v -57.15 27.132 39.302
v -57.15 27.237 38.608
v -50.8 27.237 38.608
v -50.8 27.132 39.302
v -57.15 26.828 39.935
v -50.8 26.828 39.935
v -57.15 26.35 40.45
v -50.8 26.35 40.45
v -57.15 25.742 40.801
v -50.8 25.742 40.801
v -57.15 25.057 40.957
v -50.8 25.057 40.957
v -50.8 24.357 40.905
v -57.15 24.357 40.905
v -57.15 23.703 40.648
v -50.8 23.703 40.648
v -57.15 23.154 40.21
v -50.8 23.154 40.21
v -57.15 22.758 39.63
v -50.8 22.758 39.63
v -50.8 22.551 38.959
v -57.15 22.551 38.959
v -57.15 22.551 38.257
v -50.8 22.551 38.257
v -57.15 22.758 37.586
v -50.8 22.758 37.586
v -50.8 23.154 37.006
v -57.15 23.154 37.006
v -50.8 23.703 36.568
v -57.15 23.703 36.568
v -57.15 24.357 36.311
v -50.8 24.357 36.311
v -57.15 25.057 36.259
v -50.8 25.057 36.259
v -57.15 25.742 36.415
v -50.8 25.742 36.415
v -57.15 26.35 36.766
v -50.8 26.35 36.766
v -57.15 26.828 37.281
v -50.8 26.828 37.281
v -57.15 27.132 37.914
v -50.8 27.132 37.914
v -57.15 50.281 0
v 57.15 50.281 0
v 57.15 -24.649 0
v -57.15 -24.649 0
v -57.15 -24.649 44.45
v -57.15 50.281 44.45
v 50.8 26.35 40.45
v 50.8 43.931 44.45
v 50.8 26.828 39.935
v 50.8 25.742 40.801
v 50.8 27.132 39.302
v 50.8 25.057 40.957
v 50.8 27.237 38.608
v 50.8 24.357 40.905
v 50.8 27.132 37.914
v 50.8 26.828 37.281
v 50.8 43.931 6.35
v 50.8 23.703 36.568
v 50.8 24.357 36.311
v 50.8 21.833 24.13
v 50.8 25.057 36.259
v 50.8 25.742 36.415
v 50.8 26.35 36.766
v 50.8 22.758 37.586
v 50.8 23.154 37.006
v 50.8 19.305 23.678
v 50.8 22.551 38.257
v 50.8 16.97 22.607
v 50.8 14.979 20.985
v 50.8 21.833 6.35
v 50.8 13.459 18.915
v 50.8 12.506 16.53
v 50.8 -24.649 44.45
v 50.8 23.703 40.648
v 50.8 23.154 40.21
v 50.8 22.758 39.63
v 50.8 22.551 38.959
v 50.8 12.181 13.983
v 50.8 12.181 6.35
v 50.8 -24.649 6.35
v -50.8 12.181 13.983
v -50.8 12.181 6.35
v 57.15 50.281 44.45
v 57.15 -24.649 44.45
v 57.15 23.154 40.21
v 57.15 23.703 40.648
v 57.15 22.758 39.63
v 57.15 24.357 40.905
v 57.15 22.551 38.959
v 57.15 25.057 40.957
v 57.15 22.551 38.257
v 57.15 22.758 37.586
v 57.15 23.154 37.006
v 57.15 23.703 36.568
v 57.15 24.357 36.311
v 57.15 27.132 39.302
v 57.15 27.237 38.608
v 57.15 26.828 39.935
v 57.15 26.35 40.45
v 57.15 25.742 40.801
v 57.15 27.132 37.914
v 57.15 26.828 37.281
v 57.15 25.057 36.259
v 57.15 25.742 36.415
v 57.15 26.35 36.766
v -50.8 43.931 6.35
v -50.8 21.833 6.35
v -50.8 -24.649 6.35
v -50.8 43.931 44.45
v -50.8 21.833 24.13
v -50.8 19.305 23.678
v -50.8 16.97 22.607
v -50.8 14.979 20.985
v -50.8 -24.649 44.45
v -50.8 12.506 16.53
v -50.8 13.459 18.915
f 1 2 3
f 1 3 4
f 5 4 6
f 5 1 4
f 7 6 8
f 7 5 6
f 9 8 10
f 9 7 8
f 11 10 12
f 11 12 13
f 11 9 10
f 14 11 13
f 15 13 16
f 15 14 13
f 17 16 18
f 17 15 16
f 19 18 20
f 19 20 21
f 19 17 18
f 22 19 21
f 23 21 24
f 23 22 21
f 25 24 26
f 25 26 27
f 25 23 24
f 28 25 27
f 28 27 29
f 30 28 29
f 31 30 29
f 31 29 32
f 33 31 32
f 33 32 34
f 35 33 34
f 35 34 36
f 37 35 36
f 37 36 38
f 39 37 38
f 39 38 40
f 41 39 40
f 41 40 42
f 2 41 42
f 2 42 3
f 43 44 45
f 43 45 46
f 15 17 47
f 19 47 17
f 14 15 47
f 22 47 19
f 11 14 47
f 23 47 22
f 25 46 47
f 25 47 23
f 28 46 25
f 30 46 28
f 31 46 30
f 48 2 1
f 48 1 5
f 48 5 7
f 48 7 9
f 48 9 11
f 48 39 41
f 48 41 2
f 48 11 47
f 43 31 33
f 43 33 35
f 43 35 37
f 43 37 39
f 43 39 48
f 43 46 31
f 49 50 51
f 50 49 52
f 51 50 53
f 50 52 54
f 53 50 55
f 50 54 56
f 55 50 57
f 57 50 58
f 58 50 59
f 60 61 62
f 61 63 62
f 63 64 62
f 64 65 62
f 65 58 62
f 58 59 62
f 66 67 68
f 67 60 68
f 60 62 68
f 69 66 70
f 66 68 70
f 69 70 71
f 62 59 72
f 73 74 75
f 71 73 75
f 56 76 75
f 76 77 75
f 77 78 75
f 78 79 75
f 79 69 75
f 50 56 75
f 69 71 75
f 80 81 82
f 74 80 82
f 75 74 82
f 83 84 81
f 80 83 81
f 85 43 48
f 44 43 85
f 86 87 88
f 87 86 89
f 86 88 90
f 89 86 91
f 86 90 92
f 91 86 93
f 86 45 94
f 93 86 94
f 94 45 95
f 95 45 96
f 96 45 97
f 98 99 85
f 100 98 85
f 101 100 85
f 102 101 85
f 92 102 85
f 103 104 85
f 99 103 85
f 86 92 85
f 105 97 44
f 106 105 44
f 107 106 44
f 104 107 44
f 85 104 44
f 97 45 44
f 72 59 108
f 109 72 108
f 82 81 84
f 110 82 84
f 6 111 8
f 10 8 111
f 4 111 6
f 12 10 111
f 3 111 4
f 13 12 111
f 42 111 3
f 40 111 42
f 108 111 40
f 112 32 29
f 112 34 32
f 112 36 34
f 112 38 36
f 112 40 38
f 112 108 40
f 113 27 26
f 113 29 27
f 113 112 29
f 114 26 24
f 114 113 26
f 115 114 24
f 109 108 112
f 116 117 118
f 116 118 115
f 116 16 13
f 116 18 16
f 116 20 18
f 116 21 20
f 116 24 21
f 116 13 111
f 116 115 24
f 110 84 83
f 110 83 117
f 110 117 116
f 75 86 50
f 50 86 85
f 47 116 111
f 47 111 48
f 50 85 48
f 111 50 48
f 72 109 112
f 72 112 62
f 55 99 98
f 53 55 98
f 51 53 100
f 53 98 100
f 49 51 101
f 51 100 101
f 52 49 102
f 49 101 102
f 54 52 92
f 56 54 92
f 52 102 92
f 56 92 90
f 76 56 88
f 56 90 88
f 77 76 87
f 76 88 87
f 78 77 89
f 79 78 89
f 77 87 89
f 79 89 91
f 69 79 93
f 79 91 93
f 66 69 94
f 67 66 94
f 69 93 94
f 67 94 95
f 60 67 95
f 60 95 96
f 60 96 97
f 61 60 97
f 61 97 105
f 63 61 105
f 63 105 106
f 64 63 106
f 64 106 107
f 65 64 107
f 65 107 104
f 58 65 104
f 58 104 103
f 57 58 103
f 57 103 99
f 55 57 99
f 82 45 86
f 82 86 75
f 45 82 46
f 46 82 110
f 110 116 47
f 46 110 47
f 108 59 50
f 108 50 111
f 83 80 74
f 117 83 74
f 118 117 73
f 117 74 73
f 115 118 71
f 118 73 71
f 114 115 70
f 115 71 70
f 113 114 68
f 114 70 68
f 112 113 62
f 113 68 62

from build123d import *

# Parameters (mm, degrees)
BOSS_EXTRUDE1_DEPTH = 44.45
SKETCH2_W           = 50.8
SKETCH2_H           = 6.35
BOSS_EXTRUDE2_DEPTH = 68.58
CUT_EXTRUDE1_REACH  = 90.148
SKETCH3_R           = 2.35585
SKETCH4_W           = 101.6
SKETCH4_H           = 9.652
BOSS_EXTRUDE3_DEPTH = 17.78
FILLET1_R           = 10.16


with BuildPart() as part:
    # Sketch1 → Boss-Extrude1 (new body)
    with BuildSketch(Plane.XY):
        Polygon((0, 43.931028897), (50.8, 43.931028897), (50.8, -24.648971103), (57.15, -24.648971103), (57.15, 50.281028897), (0, 50.281028897), align=None)
    boss_extrude1 = extrude(amount=BOSS_EXTRUDE1_DEPTH)

    # Sketch2 → Boss-Extrude2 (add)
    with BuildSketch(Plane.XZ.offset(-43.931028897)):
        with Locations((25.4, 3.175)):
            Rectangle(SKETCH2_W, SKETCH2_H)
    boss_extrude2 = extrude(amount=BOSS_EXTRUDE2_DEPTH)

    # Sketch3 → Cut-Extrude1 (cut, up to next)
    with BuildSketch(Plane(origin=(57.15, 0, 0), x_dir=(0, 0, -1), z_dir=(1, 0, 0)), mode=Mode.PRIVATE) as cut_extrude1_sk1:
        with Locations(Location((-38.608, 24.881028897, 0), (0, 0, 90))):
            Circle(SKETCH3_R)
    cut_extrude1_tool1 = extrude(cut_extrude1_sk1.sketch, amount=-CUT_EXTRUDE1_REACH, mode=Mode.PRIVATE) & part.part
    cut_extrude1 = cut_extrude1_tool1.solids().sort_by_distance((57.15, 24.881029, 38.608))[0]
    add(cut_extrude1, mode=Mode.SUBTRACT)

    # Mirror1: Boss-Extrude1, Boss-Extrude2, Cut-Extrude1 across plane
    add(boss_extrude1.mirror(Plane(origin=(0, 0, 0), x_dir=(0, 0, 1), z_dir=(1, 0, 0))))
    add(boss_extrude2.mirror(Plane(origin=(0, 0, 0), x_dir=(0, 0, 1), z_dir=(1, 0, 0))))
    add(cut_extrude1.mirror(Plane(origin=(0, 0, 0), x_dir=(0, 0, 1), z_dir=(1, 0, 0))), mode=Mode.SUBTRACT)

    # Sketch4 → Boss-Extrude3 (add)
    with BuildSketch(Plane.XY.offset(6.35)):
        with Locations((0, 17.007028897)):
            Rectangle(SKETCH4_W, SKETCH4_H)
    extrude(amount=BOSS_EXTRUDE3_DEPTH)

    # Fillet1
    # the kernel refuses this fillet: 10.16 mm, written as the material it takes off along each edge
    with BuildSketch(Plane(origin=(50.8, 12.181028897, 24.13), x_dir=(0, 1, 0), z_dir=(-1, 0, 0))) as fillet1_piece_1:
        with BuildLine():
            CenterArc((10.16, 10.147292053), FILLET1_R, 180, 87.134016017)
            Line((0, 10.147292053), (0, 0))
            Line((0, 0), (9.652, 0))
        make_face()
    extrude(amount=101.6, mode=Mode.SUBTRACT)


solid = part.part
